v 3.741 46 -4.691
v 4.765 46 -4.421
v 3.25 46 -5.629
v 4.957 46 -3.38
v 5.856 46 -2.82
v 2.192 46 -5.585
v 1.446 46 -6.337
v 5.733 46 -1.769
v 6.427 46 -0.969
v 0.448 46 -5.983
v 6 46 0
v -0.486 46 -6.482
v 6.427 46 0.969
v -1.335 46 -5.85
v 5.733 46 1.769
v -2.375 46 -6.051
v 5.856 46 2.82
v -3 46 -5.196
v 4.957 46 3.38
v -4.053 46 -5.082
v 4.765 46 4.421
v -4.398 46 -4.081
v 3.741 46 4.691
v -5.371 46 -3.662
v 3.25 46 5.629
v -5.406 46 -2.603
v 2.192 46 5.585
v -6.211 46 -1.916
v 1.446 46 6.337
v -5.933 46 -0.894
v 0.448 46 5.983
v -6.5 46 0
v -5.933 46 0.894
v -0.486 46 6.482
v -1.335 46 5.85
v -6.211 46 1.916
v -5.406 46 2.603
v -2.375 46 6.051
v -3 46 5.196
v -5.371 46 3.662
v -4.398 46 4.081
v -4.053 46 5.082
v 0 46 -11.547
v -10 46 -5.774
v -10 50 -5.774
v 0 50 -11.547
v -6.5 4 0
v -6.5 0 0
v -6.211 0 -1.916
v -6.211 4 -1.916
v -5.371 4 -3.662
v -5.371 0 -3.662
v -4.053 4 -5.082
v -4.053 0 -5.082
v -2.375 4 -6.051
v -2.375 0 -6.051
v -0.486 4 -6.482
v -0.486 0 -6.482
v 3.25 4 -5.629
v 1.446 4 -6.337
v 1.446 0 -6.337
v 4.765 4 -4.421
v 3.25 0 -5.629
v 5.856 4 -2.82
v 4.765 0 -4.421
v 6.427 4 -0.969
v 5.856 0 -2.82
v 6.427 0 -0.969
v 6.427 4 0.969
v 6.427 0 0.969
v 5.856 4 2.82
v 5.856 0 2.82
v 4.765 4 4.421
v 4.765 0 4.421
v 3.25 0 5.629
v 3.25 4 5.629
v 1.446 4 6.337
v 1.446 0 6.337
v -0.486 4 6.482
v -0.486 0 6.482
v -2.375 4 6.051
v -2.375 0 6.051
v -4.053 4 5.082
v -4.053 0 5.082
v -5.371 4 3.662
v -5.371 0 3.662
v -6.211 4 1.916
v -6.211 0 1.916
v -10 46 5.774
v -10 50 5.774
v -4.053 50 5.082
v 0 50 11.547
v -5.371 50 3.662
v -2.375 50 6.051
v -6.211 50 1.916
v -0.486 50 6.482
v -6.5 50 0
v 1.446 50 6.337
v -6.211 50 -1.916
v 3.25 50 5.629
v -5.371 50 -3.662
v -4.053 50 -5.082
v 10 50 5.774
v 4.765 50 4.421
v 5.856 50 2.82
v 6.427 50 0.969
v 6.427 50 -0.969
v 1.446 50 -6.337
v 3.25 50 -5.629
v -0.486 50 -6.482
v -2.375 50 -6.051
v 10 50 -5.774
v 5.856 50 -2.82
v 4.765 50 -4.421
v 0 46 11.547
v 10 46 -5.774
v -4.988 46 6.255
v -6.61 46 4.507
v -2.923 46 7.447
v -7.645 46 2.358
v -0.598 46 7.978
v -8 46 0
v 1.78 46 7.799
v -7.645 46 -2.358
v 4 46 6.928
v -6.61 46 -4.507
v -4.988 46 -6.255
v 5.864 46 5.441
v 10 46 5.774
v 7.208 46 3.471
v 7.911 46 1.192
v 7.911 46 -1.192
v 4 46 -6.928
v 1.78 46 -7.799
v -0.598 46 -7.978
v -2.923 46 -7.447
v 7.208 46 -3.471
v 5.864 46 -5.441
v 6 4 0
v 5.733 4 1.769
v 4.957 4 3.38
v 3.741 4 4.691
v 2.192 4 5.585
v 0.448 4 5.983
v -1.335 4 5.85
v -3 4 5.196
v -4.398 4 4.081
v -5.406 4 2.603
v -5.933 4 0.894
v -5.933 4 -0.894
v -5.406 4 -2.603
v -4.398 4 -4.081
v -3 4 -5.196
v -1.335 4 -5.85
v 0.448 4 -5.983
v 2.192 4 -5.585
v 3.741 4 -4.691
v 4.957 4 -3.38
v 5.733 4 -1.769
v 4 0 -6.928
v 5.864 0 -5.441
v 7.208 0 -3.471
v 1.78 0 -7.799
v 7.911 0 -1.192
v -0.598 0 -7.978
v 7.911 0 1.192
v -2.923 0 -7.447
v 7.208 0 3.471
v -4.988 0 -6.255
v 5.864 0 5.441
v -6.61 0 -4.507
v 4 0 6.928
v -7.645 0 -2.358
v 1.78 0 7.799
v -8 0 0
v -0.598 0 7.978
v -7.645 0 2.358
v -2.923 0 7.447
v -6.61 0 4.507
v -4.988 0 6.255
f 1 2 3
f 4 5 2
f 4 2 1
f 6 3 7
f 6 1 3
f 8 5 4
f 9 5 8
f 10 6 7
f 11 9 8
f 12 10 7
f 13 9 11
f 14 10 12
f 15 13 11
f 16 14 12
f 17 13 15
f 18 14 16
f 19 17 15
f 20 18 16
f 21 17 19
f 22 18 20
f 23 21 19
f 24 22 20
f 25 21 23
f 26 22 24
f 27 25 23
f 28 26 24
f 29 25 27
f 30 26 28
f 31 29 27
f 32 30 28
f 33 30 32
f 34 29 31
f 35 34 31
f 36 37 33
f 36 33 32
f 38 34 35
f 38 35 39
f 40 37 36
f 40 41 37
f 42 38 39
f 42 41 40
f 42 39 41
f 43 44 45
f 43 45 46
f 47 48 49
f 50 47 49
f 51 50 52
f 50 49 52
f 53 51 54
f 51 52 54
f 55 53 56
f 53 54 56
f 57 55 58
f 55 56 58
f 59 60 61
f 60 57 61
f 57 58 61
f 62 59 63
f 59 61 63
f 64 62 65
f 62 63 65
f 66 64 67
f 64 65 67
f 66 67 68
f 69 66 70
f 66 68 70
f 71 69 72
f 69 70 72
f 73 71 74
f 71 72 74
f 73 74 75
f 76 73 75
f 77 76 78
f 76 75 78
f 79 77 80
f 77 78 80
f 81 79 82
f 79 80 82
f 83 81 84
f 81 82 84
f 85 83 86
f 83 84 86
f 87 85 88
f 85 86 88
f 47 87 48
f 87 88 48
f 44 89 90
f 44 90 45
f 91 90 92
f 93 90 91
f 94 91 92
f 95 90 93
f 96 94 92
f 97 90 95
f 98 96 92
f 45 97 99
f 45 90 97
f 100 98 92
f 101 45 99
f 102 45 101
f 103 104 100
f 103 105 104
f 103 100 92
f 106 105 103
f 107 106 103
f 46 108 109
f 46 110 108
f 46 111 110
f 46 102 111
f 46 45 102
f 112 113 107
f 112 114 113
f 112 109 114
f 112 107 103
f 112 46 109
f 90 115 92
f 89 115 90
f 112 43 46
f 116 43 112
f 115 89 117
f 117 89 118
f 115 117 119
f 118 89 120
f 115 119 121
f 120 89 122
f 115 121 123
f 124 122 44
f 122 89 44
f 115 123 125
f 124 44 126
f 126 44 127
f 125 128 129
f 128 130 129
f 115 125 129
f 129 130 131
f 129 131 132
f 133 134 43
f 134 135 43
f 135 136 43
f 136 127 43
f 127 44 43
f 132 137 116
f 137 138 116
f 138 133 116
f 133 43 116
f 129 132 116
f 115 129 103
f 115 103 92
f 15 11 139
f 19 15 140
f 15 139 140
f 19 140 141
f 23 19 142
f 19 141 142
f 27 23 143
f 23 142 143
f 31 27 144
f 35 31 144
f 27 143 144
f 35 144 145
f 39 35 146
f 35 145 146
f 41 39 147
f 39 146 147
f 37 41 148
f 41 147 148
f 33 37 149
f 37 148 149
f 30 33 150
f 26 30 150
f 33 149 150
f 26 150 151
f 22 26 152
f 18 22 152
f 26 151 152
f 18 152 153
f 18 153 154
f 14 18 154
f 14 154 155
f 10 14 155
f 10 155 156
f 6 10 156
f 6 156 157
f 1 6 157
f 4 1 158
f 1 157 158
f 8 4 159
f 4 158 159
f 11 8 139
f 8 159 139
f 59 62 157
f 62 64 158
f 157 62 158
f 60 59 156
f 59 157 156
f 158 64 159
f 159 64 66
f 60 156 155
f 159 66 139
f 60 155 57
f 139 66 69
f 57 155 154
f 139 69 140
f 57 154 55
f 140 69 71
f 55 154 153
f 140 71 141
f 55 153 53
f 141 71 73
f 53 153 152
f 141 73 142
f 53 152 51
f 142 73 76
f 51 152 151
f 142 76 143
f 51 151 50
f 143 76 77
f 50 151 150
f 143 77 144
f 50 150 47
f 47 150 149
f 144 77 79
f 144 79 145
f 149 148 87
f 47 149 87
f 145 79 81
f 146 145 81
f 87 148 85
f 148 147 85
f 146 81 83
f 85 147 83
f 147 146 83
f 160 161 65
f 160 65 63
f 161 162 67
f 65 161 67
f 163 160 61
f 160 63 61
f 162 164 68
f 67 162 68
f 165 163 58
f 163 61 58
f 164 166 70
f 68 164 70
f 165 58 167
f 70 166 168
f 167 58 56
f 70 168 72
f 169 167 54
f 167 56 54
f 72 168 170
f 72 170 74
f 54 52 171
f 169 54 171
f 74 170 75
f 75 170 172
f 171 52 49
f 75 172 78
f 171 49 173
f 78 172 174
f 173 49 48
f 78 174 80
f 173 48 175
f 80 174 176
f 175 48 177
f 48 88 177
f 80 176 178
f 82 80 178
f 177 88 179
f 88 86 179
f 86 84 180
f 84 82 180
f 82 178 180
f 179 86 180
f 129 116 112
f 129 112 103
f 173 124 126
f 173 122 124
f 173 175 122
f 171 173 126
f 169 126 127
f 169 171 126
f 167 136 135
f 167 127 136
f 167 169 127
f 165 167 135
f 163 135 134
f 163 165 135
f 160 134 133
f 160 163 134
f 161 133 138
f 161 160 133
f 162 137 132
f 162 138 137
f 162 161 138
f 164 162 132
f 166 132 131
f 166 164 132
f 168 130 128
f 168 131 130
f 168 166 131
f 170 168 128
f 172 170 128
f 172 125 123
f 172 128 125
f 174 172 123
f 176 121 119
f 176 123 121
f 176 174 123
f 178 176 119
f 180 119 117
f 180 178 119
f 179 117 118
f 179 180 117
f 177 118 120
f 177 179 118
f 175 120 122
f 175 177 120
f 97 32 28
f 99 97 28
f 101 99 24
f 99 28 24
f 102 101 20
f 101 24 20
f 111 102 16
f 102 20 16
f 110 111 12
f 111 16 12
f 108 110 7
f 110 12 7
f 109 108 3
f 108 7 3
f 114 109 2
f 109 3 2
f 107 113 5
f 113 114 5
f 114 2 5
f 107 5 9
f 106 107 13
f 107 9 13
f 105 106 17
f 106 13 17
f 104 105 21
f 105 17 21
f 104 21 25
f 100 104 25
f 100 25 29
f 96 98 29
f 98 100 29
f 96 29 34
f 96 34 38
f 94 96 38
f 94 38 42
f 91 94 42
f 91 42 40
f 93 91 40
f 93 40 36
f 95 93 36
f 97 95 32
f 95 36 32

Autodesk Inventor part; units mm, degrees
ref_plane "YZ Plane" through (0, 0, 0) normal (1, 0, 0) x (0, 1, 0)
ref_plane "XZ Plane" through (0, 0, 0) normal (0, 1, 0) x (-1, 0, 0)
ref_plane "XY Plane" through (0, 0, 0) normal (0, 0, 1) x (1, 0, 0)
sketch "Boceto1" plane through (0, 0, 0) normal (0, 1, 0) x (-1, 0, 0)
  circle A0 centre (0, 0) radius 8
  dimension "d0" = 16
extrude "Extrusión1" add sketch "Boceto1" along normal blind 46
sketch "Boceto2" plane through (0, 46, 0) normal (0, 1, 0) x (1, 0, 0)
  line L0 (0, 11.547) -> (10, 5.7735)
  line L1 (10, 5.7735) -> (10, -5.7735)
  line L2 (10, -5.7735) -> (0, -11.547)
  line L3 (0, -11.547) -> (-10, -5.7735)
  line L4 (-10, -5.7735) -> (-10, 5.7735)
  line L5 (-10, 5.7735) -> (0, 11.547)
  point P0 (0, 0)
  point P1 (0, 0)
  point P2 (-10, 0)
  dimension "d3" = 10
extrude "Extrusión2" add sketch "Boceto2" along normal blind 4
sketch "Boceto3" plane through (0, 0, 0) normal (0, -1, 0) x (1, 0, 0)
  circle A0 centre (0, 0) radius 8 projected
  circle A1 centre (0, 0) radius 6
  dimension "d6" = 2
extrude "Extrusión3" cut sketch "Boceto3" against normal through all contours A1
sketch "Boceto4" plane through (0, 0, 0) normal (0, 0, 1) x (1, 0, 0)
  line L0 (-6, 0) -> (-6, 50) projected
  line L1 (6, 0) -> (6, 50) projected
  line L2 (-6, 0) -> (-6.5, 0)
  line L3 (-8, 0) -> (8, 0) projected
  line L4 (-6.5, 4) -> (-6.5, 0)
  line L5 (-6.5, 4) -> (-6, 4)
  line L6 (-6.5, 0) -> (-6, 0)
  line L7 (0, -14.3469) -> (0, 54.7161)
  line L8 (-6.5, 50) -> (-6.5, 46)
  line L9 (-6.5, 46) -> (-6, 46)
  line L10 (-10, 50) -> (0, 50) projected
  point P0 (0, 0)
  dimension "d9" = 0.5
  dimension "d10" = 4
  dimension "d11" = 0.5
  dimension "d12" = 4
revolve "Revolución1" cut sketch "Boceto4" angle 360 about axis through (0, -14.3469, 0) along (0, 1, 0) contours L2 L4 L5 L0 | L9 L8 L10 L0
properties part number "steering_stand_off_bush"
